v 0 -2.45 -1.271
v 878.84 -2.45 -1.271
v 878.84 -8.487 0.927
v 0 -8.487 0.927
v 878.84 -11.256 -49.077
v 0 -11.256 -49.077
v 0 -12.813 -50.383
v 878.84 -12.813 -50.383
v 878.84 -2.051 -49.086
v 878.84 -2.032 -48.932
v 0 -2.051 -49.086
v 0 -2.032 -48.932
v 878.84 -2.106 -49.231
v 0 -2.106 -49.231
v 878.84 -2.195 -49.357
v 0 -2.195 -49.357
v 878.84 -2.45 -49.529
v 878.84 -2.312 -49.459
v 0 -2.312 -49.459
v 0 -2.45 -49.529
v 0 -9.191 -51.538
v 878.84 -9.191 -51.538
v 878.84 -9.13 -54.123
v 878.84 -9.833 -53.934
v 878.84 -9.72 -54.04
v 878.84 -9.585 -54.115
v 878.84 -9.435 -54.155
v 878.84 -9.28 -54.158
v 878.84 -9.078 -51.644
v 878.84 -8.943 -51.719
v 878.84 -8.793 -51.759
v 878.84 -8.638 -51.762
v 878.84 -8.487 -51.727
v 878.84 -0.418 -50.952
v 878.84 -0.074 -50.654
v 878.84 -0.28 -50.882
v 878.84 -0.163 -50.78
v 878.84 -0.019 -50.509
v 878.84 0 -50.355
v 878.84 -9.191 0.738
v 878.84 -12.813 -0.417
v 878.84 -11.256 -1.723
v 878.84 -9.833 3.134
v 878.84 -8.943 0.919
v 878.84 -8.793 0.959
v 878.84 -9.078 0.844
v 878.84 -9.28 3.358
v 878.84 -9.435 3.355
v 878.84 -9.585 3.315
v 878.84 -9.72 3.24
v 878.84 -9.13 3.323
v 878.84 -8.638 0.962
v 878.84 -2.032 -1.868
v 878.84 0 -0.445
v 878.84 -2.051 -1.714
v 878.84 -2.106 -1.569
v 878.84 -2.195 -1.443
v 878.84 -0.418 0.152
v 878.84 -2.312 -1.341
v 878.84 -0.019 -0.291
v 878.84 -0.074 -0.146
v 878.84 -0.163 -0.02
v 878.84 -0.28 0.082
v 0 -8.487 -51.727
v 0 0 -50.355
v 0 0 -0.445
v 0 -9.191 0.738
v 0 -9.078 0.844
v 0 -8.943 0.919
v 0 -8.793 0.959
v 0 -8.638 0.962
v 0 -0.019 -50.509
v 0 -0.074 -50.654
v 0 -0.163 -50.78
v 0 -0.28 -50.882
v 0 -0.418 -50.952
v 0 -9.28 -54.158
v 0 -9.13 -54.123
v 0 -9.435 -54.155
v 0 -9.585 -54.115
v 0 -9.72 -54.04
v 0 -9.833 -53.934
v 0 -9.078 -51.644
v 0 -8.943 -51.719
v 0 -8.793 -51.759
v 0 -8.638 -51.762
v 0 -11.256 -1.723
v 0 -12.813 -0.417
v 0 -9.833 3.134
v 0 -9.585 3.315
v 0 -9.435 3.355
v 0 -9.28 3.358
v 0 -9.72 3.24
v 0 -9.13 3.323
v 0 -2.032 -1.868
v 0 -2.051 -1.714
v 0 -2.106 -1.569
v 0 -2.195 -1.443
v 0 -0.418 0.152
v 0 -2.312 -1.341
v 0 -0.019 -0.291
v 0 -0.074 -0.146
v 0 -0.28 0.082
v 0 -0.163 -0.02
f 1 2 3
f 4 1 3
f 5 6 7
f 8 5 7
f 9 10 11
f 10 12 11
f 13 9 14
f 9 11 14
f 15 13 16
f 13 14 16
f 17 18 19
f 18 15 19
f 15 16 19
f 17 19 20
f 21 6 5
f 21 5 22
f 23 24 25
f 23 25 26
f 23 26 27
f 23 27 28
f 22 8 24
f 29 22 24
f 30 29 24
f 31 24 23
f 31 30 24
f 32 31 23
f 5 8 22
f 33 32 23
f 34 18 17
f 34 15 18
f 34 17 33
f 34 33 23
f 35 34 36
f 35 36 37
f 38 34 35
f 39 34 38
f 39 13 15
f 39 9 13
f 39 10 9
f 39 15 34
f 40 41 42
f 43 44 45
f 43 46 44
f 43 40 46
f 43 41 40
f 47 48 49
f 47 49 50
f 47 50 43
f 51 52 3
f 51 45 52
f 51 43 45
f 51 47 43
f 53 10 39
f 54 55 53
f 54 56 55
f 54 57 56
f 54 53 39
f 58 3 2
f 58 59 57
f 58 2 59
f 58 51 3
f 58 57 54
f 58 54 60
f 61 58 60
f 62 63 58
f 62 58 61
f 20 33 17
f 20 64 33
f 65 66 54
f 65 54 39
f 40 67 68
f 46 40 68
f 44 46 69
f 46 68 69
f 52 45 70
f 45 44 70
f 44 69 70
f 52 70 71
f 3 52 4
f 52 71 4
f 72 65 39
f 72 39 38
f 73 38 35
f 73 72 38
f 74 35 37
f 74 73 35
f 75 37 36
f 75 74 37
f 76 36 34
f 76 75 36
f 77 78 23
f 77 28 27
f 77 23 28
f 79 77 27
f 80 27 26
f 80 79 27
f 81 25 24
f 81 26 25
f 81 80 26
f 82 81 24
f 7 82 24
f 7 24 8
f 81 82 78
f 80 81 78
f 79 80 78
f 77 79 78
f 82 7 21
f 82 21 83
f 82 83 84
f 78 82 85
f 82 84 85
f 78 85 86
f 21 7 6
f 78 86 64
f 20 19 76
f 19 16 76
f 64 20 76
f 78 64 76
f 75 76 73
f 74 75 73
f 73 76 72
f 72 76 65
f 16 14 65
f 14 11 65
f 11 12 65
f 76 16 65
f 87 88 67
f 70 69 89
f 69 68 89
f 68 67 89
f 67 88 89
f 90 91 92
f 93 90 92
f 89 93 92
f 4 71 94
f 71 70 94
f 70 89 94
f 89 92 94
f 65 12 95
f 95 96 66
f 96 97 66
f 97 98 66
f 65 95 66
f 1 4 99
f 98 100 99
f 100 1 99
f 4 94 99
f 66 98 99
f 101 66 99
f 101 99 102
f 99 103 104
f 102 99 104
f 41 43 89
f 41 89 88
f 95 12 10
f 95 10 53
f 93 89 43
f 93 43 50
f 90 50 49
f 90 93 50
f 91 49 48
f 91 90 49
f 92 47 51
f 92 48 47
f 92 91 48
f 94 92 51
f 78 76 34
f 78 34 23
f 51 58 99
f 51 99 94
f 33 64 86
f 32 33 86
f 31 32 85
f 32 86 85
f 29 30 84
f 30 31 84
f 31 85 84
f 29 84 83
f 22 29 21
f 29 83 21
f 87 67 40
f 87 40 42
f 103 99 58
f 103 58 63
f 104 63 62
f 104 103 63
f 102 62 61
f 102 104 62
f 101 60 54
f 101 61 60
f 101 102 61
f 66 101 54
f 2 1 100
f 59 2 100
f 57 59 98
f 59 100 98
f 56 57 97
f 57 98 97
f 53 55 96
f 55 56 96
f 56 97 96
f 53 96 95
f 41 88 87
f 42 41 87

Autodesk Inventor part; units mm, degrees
ref_plane "YZ Plane" through (0, 0, 0) normal (1, 0, 0) x (0, 1, 0)
ref_plane "XZ Plane" through (0, 0, 0) normal (0, 1, 0) x (-1, 0, 0)
ref_plane "XY Plane" through (0, 0, 0) normal (0, 0, 1) x (1, 0, 0)
sketch "Sketch1" plane through (0, 0, 0) normal (1, 0, 0) x (0, 1, 0)
  line L0 (0, -0.4446) -> (0, -50.3554)
  line L1 (-0.4178, -50.9521) -> (-9.1295, -54.1229)
  line L2 (-9.8331, -53.9343) -> (-12.8126, -50.3834)
  line L3 (-0.4178, 0.1521) -> (-9.1295, 3.3229)
  line L4 (-9.8331, 3.1343) -> (-12.8126, -0.4166)
  line L5 (-11.256, -49.0773) -> (-9.1911, -51.5382)
  line L6 (-8.4874, -51.7268) -> (-2.4498, -49.5293)
  line L7 (-2.032, -48.9325) -> (-2.032, -1.8675)
  line L8 (-2.4498, -1.2707) -> (-8.4874, 0.9268)
  line L9 (-9.1911, 0.7382) -> (-11.256, -1.7227)
  line L10 (-12.8126, -0.4166) -> (-11.256, -1.7227)
  line L11 (-11.256, -49.0773) -> (-12.8126, -50.3834)
  arc A0 (0, -0.4446) -> (-0.4178, 0.1521) centre (-0.635, -0.4446) ccw
  arc A1 (-2.032, -1.8675) -> (-2.4498, -1.2707) centre (-2.667, -1.8675) ccw
  arc A2 (-9.1295, 3.3229) -> (-9.8331, 3.1343) centre (-9.3466, 2.7261) ccw
  arc A3 (-8.4874, 0.9268) -> (-9.1911, 0.7382) centre (-8.7046, 0.3301) ccw
  arc A4 (-2.4498, -49.5293) -> (-2.032, -48.9325) centre (-2.667, -48.9325) ccw
  arc A5 (-0.4178, -50.9521) -> (0, -50.3554) centre (-0.635, -50.3554) ccw
  arc A6 (-9.1911, -51.5382) -> (-8.4874, -51.7268) centre (-8.7046, -51.1301) ccw
  arc A7 (-9.8331, -53.9343) -> (-9.1295, -54.1229) centre (-9.3466, -53.5261) ccw
  point P0 (0, 0)
  point P1 (0, -50.8)
  point P2 (-9.5473, -54.2749)
  point P3 (-9.5473, 3.4749)
  dimension "d0" = 50.8
  dimension "d1" = 10.16
  dimension "d2" = 5.08
  dimension "d3" = 110
  dimension "d4" = 110
  dimension "d5" = 10.16
  dimension "d6" = 5.08
  dimension "d7" = 110
  dimension "d8" = 110
  dimension "d9" = 2.032
  dimension "d10" = 0.635
extrude "Extrusion1" add sketch "Sketch1" along normal blind 878.84
properties part number "the outside slider part"
